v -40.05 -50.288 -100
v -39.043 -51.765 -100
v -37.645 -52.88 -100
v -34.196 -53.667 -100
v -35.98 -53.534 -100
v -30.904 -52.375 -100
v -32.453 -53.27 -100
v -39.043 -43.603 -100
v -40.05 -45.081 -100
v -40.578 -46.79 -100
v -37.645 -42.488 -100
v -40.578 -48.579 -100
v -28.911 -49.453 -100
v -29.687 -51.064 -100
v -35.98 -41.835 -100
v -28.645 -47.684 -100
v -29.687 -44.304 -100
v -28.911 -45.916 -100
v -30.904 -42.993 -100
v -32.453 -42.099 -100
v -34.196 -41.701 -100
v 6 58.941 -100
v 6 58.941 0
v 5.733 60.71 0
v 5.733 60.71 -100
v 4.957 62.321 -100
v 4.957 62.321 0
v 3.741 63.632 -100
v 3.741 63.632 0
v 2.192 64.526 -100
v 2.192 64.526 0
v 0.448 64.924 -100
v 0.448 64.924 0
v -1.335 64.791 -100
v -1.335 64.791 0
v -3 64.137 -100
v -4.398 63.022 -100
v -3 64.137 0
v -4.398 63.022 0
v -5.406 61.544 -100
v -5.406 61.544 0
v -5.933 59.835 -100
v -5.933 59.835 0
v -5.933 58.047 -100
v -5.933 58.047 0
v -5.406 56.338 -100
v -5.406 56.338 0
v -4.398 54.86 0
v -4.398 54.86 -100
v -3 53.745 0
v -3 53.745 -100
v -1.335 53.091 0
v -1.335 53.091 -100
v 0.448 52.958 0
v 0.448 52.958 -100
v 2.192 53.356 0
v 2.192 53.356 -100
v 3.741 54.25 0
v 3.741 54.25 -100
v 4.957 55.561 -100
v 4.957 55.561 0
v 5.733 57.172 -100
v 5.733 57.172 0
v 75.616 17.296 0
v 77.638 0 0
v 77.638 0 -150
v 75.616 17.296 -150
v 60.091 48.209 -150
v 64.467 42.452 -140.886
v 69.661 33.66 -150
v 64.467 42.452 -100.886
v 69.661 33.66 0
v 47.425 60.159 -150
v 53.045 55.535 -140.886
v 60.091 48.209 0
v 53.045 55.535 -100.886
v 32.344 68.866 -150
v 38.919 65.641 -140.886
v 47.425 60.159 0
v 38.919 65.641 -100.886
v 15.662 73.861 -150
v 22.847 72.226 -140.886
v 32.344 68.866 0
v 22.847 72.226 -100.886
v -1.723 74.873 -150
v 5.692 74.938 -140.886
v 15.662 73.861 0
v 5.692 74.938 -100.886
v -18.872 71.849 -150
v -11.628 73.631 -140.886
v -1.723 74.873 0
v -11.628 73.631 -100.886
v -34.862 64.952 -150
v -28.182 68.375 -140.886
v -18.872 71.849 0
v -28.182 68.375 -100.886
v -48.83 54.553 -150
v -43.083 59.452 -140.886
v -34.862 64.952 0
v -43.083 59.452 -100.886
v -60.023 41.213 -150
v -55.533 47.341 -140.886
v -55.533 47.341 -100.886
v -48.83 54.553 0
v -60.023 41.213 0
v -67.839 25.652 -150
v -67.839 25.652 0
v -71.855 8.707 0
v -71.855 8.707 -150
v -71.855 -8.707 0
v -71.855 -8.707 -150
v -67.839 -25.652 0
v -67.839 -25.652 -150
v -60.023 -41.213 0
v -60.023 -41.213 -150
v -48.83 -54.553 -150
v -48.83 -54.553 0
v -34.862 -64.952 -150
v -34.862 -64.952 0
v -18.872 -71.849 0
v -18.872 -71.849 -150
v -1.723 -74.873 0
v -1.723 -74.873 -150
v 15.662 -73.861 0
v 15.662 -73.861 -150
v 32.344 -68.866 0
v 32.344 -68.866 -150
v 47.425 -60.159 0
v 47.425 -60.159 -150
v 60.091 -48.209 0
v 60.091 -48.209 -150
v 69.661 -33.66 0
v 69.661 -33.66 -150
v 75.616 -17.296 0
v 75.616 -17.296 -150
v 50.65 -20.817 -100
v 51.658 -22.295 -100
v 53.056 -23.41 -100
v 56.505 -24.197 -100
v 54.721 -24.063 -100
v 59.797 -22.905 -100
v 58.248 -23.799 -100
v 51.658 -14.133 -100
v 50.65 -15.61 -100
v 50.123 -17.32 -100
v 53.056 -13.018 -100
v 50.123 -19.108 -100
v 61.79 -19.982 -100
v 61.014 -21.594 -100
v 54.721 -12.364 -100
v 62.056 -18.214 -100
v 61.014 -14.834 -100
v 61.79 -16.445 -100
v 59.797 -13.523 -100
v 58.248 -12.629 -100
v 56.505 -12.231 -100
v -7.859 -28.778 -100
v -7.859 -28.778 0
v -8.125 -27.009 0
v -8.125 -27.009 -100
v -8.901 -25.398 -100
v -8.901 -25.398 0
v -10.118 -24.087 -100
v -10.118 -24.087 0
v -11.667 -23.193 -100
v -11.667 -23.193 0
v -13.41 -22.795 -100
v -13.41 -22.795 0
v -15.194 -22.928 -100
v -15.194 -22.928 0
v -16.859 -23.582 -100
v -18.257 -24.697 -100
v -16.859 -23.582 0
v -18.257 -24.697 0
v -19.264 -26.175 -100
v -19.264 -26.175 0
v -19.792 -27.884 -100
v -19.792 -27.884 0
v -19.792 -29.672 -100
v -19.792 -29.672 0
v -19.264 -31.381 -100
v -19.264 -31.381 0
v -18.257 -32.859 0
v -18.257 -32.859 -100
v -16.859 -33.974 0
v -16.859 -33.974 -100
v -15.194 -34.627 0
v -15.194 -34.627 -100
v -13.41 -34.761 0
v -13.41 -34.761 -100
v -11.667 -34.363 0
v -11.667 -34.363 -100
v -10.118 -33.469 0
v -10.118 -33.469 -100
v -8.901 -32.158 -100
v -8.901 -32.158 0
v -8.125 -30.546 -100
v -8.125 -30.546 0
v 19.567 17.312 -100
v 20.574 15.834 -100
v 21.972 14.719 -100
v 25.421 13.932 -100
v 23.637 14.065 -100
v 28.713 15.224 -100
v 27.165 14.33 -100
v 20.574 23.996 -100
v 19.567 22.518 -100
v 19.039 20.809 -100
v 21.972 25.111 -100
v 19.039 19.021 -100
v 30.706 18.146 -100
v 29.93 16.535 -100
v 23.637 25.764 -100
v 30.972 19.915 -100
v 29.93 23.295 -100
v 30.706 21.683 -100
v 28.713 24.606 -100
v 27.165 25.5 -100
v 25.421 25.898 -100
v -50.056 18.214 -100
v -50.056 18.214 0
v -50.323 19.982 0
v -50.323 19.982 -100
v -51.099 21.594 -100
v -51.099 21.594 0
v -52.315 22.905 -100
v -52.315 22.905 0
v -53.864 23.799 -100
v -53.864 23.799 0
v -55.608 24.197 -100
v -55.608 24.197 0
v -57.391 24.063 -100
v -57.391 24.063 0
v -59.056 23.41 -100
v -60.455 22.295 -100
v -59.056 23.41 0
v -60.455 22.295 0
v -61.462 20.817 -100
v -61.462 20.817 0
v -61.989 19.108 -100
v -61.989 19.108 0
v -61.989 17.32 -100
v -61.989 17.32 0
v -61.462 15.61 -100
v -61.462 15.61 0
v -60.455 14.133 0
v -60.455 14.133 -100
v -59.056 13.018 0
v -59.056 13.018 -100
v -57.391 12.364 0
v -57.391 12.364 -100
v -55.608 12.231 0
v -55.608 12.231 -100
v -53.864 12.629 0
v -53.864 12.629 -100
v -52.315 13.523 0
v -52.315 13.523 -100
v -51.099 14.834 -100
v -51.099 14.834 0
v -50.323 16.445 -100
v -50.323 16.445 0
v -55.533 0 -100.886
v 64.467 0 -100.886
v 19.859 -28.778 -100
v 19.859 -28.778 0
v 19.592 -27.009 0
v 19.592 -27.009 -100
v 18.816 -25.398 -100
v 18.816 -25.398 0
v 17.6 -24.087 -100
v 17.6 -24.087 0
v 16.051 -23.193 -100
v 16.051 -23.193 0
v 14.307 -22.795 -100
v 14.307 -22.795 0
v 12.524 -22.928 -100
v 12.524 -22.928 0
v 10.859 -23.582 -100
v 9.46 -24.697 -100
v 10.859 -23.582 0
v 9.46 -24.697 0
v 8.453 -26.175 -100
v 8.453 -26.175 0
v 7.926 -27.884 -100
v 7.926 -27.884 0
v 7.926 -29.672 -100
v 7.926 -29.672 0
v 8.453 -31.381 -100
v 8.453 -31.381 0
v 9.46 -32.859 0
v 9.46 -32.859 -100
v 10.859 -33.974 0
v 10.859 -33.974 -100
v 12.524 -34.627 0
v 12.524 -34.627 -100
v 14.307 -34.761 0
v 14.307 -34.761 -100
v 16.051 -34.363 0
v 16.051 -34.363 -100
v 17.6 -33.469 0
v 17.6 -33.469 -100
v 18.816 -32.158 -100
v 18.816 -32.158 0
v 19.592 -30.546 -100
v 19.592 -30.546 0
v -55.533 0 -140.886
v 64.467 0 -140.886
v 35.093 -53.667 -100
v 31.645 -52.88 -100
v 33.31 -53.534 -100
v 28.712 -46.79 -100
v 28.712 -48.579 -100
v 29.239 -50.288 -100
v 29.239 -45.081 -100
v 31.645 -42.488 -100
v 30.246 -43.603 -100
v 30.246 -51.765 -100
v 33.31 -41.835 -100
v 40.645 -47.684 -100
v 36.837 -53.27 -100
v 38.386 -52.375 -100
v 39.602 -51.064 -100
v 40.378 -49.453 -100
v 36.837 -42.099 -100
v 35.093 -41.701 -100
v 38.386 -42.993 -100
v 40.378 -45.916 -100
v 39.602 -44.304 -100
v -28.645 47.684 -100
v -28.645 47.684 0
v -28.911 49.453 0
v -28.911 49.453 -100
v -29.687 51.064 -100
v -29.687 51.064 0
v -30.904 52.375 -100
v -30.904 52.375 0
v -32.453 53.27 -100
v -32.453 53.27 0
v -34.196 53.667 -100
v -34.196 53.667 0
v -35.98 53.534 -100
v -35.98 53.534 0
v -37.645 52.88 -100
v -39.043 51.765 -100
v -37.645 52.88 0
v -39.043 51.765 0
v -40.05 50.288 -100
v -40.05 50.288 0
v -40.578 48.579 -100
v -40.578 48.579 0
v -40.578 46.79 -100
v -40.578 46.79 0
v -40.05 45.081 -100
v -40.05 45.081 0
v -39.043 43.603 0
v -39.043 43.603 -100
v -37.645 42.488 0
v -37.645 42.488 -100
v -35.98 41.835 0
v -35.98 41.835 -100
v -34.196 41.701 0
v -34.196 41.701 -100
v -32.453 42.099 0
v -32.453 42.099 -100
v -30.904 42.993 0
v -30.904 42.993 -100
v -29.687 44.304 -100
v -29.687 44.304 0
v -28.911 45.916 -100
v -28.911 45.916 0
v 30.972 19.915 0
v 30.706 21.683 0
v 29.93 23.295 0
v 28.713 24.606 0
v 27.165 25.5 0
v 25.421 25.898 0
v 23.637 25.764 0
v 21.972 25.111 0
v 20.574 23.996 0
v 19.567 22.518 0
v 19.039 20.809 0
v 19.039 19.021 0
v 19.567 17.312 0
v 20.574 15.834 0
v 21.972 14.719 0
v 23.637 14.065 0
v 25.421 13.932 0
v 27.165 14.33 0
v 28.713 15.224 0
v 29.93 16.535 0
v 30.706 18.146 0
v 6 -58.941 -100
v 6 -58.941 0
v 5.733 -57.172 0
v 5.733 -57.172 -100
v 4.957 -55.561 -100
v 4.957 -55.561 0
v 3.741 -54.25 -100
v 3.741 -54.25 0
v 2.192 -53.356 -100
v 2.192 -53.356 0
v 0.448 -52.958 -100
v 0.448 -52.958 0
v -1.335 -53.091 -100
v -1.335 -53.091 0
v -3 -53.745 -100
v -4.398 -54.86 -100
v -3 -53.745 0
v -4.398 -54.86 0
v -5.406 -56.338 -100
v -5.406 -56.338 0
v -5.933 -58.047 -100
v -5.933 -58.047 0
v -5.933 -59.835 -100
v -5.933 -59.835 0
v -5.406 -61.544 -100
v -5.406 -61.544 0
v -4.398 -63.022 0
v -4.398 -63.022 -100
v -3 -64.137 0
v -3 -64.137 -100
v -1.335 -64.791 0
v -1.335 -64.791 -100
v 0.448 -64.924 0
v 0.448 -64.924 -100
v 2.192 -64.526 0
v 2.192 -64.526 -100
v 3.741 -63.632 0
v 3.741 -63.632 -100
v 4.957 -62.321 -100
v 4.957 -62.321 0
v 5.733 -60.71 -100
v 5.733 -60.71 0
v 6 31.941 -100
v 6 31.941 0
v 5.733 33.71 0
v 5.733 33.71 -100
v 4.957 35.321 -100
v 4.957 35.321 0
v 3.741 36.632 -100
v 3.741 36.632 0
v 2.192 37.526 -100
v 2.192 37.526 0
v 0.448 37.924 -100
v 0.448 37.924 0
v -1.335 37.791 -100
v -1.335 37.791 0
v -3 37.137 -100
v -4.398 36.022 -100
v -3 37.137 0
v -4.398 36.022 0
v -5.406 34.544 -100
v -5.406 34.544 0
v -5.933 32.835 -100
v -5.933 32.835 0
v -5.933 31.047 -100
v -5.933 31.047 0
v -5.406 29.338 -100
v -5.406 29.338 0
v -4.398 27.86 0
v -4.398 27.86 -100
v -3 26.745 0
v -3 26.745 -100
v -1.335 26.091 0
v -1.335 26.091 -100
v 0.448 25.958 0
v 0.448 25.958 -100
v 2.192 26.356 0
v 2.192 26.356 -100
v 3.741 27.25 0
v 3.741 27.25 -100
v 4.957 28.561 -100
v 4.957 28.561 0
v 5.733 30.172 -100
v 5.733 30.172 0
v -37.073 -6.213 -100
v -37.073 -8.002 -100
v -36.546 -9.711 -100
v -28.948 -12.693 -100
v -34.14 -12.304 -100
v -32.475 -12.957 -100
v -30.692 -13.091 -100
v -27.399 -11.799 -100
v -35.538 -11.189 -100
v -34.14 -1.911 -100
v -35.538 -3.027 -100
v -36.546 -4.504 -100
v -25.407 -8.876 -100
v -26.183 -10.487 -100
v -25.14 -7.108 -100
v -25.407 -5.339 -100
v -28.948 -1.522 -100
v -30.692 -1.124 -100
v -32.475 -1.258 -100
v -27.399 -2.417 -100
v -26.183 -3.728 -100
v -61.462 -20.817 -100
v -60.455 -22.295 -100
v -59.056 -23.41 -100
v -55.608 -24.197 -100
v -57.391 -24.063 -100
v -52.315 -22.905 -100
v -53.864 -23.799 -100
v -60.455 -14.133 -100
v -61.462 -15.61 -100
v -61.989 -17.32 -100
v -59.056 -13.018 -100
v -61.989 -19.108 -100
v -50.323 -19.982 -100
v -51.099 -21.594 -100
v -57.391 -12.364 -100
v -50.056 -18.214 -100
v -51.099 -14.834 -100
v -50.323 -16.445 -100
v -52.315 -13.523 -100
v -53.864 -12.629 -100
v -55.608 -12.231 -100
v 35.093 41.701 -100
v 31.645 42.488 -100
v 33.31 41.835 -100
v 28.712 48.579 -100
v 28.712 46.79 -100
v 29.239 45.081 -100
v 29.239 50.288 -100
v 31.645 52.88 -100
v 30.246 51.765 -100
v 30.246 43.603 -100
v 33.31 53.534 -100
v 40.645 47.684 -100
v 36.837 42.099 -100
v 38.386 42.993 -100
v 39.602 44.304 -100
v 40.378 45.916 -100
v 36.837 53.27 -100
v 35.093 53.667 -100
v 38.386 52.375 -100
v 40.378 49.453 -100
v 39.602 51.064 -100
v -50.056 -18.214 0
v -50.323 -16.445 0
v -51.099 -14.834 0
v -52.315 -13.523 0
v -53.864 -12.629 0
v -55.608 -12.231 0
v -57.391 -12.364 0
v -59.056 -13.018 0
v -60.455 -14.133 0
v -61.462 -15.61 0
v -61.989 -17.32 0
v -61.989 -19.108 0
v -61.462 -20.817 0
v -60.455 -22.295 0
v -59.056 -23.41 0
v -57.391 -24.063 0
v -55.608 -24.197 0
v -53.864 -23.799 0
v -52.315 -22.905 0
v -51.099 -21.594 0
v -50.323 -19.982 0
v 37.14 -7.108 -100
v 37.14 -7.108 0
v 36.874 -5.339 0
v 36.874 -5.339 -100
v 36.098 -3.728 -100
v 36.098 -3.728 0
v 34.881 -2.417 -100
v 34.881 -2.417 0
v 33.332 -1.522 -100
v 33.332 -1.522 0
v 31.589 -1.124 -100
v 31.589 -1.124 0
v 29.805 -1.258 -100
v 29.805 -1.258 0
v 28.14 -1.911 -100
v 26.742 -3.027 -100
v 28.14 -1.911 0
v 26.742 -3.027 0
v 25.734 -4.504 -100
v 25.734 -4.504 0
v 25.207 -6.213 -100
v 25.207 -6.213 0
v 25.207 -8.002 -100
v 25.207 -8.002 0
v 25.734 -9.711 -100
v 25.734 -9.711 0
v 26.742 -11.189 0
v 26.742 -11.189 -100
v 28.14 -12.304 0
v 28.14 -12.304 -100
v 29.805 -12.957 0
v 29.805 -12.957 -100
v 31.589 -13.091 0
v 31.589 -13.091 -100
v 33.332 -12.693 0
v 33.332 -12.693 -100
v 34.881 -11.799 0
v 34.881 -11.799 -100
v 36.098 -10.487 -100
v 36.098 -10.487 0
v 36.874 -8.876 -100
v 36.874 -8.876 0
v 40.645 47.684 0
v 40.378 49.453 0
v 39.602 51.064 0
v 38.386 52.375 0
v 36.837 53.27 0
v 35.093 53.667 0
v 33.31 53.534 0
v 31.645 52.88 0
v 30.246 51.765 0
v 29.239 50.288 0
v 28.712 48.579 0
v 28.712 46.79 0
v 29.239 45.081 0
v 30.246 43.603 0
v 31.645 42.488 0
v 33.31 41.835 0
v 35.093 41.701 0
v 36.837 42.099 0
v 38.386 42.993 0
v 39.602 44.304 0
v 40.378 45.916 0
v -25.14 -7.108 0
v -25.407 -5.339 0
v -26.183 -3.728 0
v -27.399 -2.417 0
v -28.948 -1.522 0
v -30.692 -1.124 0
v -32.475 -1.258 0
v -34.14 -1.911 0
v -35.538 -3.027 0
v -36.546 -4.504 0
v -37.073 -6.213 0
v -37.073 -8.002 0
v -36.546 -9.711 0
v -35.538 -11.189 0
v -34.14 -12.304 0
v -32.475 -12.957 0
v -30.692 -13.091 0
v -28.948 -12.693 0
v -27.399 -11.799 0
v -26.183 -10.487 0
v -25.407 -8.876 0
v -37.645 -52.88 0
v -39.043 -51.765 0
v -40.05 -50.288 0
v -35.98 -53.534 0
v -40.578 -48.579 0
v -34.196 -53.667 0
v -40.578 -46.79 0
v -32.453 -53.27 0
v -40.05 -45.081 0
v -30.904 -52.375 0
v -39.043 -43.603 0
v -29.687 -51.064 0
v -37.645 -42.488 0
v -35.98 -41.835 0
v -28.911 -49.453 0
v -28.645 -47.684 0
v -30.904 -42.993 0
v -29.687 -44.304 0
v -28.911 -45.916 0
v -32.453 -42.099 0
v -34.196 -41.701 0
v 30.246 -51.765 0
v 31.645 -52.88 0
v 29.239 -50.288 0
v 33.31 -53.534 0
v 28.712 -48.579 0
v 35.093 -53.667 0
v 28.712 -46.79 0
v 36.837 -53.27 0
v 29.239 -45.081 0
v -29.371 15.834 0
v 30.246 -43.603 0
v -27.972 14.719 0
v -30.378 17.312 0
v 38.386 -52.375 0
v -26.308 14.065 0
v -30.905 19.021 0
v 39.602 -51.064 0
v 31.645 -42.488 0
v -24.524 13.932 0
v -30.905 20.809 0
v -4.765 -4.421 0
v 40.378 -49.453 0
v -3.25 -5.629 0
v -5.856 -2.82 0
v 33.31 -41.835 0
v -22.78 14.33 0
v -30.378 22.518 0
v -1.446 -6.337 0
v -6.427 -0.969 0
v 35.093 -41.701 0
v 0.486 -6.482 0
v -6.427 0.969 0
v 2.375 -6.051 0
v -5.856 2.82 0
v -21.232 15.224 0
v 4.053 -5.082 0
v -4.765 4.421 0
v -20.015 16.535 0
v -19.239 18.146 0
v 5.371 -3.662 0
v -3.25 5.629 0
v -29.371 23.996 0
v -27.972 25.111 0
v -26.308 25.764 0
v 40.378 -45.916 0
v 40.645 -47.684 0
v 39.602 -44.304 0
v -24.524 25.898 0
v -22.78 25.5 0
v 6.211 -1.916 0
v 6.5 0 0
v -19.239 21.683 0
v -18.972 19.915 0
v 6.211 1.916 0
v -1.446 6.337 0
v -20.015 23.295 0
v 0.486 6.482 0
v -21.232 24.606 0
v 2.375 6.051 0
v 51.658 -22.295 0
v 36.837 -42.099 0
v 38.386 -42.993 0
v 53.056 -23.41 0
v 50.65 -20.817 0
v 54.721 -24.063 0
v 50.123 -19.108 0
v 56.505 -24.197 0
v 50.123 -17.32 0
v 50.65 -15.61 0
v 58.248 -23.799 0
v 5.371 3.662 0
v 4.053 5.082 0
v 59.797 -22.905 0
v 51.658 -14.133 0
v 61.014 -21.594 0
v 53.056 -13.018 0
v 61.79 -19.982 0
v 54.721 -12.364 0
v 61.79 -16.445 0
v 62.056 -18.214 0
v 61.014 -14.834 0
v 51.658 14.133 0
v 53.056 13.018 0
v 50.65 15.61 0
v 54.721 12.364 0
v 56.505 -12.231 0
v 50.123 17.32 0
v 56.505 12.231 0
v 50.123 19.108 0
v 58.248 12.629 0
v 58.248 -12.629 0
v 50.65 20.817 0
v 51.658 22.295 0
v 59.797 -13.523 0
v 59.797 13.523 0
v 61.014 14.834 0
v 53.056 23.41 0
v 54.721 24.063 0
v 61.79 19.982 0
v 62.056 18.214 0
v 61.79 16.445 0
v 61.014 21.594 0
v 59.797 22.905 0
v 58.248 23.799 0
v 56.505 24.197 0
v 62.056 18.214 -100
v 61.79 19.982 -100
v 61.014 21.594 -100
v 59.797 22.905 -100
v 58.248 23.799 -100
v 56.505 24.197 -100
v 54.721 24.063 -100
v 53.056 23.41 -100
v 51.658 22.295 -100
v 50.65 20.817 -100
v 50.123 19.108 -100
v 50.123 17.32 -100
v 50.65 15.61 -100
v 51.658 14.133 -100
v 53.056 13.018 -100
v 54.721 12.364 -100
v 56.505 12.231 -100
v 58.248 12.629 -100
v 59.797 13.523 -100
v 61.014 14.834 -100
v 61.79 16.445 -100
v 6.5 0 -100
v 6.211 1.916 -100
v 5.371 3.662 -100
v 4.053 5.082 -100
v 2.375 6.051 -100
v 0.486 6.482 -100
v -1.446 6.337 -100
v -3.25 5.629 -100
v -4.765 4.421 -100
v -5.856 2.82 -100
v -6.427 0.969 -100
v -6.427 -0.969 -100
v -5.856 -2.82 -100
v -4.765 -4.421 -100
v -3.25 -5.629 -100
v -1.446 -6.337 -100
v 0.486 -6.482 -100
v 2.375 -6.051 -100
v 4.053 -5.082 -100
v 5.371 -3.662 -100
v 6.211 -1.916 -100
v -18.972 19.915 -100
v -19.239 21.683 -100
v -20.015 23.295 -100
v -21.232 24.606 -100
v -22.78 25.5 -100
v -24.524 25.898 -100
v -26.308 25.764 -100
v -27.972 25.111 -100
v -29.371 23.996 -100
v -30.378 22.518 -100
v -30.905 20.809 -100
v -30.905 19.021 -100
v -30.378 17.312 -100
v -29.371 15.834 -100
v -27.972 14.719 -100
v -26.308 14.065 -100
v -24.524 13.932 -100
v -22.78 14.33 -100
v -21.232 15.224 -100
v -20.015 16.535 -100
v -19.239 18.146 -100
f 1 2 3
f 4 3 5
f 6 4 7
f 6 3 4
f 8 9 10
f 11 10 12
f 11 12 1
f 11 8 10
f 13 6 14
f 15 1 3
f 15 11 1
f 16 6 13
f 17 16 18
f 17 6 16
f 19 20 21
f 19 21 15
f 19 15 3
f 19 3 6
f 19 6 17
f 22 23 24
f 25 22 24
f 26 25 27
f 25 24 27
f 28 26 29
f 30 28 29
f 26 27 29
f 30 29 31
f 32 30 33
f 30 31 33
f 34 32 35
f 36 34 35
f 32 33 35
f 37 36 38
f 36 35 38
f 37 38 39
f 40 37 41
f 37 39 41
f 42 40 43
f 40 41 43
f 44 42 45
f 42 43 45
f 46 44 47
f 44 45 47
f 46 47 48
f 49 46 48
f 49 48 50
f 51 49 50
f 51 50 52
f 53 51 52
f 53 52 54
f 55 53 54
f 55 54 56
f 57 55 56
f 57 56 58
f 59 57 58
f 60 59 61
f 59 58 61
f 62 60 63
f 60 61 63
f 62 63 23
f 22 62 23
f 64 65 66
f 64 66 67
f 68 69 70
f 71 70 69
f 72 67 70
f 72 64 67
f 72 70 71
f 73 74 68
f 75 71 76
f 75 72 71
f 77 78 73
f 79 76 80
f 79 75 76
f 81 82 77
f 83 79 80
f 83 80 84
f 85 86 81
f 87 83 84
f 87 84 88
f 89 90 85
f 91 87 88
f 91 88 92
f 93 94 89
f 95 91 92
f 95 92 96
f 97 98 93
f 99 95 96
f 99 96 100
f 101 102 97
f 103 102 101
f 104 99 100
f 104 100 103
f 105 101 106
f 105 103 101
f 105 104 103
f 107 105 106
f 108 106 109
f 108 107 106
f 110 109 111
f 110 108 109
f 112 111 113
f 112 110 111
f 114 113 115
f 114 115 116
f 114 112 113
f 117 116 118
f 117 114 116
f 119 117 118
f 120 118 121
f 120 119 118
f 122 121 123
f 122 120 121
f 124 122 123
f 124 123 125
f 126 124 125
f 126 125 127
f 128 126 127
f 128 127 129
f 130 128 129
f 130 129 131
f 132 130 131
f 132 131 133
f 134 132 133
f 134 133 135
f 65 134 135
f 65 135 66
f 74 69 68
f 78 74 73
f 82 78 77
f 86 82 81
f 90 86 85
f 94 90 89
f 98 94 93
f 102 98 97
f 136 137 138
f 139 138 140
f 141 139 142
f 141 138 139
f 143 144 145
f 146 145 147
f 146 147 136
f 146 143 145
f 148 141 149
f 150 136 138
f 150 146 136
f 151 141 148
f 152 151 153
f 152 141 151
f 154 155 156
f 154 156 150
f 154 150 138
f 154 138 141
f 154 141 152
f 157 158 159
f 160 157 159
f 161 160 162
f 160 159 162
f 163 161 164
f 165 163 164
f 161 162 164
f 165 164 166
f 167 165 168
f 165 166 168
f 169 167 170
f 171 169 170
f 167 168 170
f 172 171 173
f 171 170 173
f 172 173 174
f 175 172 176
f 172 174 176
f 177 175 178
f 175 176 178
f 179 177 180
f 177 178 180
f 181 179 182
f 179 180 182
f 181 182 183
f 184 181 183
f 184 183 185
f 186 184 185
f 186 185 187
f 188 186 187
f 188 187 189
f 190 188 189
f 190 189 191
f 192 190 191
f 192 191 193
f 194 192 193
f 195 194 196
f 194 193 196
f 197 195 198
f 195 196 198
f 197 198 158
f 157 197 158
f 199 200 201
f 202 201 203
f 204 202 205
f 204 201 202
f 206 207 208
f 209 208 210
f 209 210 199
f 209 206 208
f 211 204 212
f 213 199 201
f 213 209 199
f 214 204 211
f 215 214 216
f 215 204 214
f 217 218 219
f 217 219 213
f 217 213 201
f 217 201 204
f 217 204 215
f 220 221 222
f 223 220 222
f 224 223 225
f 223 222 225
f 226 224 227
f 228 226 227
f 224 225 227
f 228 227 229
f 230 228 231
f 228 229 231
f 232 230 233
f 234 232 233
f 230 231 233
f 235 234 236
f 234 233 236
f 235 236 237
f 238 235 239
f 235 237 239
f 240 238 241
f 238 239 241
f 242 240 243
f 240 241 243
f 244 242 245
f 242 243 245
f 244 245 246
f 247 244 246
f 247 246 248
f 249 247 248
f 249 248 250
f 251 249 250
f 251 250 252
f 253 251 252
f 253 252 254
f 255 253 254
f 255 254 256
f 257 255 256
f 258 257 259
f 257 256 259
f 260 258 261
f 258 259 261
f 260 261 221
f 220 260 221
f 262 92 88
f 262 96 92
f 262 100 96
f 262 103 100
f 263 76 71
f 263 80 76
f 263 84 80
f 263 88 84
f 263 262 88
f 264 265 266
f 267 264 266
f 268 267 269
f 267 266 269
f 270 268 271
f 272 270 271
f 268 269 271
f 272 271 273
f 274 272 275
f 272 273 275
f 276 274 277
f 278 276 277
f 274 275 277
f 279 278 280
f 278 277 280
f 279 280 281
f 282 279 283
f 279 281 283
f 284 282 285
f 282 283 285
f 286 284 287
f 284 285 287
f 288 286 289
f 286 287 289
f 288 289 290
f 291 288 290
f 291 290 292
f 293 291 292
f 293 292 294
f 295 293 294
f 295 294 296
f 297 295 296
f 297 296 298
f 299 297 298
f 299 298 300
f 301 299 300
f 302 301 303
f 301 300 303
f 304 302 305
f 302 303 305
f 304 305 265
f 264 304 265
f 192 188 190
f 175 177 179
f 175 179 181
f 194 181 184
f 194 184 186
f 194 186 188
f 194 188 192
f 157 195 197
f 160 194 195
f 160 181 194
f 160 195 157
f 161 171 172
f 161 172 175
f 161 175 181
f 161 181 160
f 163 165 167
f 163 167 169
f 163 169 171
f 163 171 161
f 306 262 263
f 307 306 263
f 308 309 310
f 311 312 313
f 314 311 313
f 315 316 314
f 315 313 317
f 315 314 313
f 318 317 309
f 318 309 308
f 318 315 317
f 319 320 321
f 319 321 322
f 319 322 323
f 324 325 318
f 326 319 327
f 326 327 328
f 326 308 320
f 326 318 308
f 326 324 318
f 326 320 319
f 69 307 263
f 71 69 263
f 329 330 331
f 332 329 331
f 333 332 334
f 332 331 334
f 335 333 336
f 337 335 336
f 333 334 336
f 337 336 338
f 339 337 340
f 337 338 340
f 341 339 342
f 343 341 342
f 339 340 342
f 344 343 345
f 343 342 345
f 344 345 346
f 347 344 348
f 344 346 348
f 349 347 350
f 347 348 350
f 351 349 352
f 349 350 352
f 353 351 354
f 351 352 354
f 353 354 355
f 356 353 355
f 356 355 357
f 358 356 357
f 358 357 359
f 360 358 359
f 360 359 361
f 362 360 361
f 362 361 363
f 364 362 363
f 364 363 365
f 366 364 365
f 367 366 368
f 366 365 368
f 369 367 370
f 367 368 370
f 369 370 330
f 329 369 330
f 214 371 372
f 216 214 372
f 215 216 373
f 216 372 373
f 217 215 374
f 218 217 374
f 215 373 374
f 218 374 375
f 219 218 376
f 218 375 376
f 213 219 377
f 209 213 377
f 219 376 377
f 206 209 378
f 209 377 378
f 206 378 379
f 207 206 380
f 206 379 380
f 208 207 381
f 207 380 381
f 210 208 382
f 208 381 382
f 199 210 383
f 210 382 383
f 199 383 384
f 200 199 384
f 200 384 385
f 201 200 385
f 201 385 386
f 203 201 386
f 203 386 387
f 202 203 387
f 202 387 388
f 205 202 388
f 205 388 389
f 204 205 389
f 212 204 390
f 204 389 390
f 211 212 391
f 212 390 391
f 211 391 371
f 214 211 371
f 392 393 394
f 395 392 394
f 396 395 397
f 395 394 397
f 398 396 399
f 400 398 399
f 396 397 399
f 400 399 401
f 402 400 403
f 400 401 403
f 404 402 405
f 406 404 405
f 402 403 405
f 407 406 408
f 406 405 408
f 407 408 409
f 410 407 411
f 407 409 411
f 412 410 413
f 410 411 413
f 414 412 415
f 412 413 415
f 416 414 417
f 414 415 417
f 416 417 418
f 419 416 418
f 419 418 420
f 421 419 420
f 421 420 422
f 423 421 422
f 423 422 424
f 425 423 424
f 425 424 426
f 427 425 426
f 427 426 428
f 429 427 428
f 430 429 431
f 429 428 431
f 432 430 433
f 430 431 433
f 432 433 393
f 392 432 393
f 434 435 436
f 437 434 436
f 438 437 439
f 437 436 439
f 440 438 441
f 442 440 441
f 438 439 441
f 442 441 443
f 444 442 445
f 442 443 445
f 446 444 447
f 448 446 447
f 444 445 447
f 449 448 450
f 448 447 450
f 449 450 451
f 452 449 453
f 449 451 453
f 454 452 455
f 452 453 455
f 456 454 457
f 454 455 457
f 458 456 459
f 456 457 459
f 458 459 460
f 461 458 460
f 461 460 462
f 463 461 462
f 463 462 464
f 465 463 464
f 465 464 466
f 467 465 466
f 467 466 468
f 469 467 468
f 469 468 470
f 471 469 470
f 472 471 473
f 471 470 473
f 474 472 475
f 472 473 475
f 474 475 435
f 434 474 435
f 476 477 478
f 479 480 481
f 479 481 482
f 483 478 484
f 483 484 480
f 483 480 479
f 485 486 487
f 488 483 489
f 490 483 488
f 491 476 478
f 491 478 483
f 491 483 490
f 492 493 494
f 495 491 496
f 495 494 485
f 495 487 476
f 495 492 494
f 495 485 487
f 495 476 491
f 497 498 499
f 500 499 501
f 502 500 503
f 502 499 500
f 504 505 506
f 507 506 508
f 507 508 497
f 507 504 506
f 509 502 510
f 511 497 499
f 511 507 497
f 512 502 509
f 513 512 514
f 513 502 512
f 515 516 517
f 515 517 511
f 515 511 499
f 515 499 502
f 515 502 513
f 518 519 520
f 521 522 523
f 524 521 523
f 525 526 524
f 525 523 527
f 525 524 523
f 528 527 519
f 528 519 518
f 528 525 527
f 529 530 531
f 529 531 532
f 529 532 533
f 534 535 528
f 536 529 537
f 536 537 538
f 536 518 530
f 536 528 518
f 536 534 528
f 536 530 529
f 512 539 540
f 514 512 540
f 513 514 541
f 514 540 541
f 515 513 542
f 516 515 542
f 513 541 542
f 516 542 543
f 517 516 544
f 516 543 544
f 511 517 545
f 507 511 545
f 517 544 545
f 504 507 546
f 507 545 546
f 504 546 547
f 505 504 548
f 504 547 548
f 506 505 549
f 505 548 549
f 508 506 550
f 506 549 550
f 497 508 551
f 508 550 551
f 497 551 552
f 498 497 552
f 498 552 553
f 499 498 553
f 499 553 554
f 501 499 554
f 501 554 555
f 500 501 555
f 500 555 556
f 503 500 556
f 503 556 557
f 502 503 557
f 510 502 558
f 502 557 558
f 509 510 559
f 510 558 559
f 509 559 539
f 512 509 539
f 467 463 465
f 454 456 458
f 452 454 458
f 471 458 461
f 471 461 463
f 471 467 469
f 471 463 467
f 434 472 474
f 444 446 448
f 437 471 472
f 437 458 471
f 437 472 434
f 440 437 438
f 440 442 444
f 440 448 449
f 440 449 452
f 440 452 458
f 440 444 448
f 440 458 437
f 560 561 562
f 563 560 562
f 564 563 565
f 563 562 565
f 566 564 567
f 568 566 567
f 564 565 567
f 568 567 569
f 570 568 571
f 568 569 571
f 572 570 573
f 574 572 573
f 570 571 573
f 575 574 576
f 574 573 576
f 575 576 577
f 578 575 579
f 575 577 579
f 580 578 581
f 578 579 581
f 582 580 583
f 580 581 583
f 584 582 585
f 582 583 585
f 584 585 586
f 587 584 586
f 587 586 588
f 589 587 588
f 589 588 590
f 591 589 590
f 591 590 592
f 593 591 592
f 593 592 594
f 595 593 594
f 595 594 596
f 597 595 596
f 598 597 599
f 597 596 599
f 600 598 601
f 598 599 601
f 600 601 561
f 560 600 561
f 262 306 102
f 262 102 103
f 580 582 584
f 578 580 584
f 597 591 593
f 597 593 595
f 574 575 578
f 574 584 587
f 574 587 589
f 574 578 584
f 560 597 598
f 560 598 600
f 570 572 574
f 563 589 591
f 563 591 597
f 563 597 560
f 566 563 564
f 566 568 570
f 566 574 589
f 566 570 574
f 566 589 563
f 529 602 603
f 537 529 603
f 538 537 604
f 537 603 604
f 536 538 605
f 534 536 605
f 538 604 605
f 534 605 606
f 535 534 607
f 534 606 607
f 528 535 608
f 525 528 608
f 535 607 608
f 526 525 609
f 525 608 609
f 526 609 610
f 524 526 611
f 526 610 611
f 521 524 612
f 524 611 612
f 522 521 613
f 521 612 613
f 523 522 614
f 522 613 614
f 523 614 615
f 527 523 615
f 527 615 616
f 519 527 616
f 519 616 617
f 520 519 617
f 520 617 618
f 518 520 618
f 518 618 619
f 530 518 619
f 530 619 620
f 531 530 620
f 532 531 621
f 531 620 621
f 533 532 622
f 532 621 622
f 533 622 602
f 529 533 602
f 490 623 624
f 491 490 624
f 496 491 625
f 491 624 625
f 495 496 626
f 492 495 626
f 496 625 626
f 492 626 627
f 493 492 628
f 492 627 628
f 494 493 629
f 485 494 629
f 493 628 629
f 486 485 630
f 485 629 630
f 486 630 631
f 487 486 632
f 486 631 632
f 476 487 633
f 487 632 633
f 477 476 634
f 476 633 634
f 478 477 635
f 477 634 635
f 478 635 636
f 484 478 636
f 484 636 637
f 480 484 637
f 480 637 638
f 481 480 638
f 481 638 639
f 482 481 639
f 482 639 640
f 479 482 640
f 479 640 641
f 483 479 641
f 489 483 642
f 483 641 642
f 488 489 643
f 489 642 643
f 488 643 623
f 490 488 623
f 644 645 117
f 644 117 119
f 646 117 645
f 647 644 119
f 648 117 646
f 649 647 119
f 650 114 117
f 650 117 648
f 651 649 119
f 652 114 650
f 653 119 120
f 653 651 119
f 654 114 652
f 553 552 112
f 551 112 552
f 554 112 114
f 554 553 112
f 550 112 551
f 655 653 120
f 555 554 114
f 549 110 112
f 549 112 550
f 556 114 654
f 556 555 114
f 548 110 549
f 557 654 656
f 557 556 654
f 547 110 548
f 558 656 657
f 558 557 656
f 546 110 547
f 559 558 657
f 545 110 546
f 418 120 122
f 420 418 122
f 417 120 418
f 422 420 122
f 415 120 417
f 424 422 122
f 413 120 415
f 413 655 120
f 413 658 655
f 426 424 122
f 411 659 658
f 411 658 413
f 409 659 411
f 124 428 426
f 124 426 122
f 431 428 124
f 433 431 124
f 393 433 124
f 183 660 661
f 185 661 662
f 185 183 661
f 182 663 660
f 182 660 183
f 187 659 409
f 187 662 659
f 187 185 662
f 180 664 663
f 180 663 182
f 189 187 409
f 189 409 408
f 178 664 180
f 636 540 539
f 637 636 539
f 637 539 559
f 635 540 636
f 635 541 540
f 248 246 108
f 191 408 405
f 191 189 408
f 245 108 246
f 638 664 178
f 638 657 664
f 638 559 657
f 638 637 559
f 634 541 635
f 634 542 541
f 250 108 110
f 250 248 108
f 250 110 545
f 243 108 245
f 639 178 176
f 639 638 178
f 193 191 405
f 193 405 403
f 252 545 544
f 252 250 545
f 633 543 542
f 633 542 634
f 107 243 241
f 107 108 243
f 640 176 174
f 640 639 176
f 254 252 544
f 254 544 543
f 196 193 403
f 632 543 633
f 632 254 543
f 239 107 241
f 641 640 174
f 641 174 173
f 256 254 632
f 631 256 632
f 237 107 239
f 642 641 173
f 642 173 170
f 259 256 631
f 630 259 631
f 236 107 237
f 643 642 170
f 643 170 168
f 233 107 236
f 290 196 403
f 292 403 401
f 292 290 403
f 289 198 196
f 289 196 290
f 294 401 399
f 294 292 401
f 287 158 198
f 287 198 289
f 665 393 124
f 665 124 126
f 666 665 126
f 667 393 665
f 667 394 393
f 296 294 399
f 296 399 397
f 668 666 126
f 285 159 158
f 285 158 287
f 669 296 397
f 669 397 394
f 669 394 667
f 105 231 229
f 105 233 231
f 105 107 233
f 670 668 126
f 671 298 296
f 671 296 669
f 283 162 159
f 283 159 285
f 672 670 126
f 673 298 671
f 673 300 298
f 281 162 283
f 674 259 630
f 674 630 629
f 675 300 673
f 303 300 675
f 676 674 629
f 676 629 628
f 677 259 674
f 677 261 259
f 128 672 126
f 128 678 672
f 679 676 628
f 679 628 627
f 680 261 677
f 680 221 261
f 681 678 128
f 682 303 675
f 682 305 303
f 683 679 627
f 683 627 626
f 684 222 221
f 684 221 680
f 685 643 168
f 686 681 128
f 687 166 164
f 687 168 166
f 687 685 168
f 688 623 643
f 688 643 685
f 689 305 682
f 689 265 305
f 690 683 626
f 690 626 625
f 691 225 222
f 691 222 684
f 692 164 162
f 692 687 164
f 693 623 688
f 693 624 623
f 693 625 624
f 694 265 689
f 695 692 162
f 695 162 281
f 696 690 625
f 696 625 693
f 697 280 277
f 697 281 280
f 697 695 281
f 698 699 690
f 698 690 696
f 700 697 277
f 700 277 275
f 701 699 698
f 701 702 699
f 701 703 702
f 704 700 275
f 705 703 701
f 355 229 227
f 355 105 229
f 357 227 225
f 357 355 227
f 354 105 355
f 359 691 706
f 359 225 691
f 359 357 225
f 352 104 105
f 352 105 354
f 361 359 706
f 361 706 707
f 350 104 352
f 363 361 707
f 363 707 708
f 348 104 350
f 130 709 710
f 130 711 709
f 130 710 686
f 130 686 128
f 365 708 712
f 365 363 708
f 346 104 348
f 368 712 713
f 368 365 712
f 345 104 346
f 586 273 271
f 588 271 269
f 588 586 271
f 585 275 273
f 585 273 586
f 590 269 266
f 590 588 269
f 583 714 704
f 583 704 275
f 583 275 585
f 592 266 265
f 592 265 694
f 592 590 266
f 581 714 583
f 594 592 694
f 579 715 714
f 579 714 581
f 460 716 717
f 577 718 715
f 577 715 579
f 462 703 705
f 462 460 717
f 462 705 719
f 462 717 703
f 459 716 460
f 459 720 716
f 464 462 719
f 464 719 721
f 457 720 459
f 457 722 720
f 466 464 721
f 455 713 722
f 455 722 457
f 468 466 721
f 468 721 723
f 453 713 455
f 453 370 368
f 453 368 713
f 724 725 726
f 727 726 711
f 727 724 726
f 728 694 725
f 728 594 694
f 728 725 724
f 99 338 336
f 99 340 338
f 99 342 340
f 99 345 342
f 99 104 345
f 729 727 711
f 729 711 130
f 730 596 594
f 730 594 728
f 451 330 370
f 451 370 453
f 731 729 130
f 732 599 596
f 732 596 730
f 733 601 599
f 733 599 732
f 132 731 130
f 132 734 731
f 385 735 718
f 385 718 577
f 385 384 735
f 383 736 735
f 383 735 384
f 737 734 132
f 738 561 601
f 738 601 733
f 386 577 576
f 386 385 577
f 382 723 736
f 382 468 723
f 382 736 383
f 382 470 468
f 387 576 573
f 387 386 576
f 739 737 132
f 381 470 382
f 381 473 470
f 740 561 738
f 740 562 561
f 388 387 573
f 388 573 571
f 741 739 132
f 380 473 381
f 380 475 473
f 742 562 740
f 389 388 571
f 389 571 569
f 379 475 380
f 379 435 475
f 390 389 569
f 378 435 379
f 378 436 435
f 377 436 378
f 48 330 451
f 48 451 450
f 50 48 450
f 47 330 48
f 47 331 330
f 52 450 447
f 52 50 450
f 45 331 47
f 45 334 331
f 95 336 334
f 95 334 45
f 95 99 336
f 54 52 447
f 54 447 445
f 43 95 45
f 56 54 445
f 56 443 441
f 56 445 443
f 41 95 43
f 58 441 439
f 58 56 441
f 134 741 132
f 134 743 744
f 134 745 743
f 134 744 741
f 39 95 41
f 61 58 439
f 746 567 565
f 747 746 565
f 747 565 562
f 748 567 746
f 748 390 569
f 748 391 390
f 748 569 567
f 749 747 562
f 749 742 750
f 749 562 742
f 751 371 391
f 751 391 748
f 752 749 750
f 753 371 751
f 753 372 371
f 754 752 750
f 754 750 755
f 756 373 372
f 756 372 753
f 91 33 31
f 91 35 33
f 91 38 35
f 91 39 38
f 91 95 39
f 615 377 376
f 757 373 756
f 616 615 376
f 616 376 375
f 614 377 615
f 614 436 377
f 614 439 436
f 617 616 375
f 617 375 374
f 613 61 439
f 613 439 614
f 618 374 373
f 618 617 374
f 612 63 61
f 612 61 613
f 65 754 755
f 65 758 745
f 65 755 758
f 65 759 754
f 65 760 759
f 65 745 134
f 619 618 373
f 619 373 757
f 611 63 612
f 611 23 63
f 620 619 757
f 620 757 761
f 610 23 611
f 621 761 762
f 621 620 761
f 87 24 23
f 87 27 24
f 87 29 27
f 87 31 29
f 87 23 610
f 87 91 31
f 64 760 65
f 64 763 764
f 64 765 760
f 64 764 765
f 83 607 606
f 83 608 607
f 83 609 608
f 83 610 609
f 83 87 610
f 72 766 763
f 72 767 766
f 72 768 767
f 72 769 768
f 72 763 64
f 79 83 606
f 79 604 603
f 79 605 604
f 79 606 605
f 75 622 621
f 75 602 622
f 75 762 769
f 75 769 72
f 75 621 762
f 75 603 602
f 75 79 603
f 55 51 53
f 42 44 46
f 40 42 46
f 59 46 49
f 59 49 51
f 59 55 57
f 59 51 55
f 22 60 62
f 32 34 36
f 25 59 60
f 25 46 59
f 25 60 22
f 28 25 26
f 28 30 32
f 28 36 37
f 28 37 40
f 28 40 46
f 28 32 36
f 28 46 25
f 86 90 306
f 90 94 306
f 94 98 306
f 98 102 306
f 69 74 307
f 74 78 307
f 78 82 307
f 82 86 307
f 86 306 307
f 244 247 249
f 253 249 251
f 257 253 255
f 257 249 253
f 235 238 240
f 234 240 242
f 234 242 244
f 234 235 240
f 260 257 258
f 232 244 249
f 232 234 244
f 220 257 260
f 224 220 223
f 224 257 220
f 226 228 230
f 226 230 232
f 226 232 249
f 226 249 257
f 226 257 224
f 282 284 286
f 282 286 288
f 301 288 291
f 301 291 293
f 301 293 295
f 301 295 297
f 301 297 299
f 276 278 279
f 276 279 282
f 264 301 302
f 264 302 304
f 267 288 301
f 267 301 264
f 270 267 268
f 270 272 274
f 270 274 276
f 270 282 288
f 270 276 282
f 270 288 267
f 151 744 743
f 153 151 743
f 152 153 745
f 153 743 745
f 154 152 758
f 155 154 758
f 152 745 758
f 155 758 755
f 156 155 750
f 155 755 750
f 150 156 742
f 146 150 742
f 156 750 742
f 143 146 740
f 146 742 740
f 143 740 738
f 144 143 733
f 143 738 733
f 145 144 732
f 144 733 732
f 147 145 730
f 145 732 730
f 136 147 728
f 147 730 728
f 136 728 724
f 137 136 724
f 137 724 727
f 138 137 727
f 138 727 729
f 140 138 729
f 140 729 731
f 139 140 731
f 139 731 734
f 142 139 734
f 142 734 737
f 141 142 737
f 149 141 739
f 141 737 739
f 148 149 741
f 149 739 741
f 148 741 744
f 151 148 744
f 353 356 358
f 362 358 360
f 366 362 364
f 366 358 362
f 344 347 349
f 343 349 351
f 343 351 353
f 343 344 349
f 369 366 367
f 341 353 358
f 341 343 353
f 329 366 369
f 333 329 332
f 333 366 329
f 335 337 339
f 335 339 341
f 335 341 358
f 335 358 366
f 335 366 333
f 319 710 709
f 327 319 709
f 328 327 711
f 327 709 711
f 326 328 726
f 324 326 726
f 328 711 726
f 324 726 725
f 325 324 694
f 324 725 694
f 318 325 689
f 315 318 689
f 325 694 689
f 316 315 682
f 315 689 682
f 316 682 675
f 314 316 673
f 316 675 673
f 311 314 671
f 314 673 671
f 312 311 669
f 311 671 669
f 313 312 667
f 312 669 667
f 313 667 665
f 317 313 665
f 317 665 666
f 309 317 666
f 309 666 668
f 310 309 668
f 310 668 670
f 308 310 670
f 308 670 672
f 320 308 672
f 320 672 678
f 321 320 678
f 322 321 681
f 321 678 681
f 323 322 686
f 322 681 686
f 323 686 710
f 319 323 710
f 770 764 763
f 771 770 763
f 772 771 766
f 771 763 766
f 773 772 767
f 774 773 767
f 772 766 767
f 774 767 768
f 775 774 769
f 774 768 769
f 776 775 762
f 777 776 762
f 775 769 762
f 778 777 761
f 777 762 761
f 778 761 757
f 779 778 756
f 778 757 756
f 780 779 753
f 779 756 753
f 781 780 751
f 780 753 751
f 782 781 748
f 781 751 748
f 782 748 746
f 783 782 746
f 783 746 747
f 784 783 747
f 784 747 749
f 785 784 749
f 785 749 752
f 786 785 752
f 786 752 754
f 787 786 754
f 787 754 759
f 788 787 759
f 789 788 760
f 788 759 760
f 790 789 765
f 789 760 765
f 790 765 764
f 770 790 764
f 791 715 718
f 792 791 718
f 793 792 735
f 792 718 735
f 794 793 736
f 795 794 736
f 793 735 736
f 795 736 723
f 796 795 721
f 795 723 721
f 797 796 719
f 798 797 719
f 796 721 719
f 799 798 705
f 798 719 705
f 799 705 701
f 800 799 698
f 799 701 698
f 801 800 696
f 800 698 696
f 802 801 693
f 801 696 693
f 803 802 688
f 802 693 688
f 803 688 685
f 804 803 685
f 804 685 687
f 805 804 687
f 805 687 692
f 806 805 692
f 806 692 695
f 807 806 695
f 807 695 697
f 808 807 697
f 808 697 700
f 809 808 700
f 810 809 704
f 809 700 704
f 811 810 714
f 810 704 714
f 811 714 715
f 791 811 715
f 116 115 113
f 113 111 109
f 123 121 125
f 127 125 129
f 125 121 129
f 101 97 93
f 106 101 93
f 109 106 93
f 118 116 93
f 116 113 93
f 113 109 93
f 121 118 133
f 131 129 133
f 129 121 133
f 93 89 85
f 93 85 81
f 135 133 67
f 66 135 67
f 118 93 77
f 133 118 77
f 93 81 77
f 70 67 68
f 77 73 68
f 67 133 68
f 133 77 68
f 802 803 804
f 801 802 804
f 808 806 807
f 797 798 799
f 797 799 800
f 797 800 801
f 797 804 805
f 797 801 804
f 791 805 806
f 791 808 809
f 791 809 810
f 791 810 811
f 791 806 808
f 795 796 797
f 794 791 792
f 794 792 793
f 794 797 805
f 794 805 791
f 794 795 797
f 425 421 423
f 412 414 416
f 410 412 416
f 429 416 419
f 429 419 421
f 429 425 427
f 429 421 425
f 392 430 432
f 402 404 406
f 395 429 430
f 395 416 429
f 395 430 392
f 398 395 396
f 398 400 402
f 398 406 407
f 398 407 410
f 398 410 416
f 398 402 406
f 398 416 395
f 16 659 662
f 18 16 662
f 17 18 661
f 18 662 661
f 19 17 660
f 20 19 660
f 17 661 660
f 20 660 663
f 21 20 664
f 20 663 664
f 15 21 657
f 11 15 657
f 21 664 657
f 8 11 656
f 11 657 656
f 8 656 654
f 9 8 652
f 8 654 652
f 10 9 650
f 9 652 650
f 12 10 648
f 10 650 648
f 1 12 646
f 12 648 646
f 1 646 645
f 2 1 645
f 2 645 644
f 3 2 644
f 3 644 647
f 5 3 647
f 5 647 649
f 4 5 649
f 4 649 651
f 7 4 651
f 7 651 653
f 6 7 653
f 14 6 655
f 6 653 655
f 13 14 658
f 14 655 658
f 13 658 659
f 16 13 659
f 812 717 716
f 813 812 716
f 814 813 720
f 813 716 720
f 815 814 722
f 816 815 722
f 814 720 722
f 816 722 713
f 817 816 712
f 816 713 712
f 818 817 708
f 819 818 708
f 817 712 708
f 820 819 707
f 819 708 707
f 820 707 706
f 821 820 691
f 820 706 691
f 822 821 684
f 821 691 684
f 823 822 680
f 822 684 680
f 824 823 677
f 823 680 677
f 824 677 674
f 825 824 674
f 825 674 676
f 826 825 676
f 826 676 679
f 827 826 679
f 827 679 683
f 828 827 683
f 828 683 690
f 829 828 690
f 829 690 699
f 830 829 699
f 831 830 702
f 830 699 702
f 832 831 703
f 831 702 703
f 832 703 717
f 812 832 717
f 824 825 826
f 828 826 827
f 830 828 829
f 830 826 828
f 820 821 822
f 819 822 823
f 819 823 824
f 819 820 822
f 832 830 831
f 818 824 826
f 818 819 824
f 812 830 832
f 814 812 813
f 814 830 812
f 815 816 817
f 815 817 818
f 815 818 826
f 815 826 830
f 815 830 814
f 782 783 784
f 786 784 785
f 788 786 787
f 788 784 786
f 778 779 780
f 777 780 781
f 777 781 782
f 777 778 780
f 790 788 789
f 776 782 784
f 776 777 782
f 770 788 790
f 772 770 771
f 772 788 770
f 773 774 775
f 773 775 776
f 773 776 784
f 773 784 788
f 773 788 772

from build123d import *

# Parameters (mm, degrees)
F0_R     = 75
F2_DEPTH = 150
F1_R     = 6
F1_R_2   = 6.5
F3_DEPTH = 100
F4_W     = 120
F4_H     = 40
F5_DEPTH = 90


with BuildPart() as f2:
    # F0 (on Top) → F2 (new body)
    with BuildSketch(Plane.XY):
        with Locations((2.638103, 0)):
            Circle(F0_R)
    extrude(amount=-F2_DEPTH)

    # F1 (on face) → F3 (cut)
    with BuildSketch(Plane.XY):
        with Locations((0, 58.940991)):
            Circle(F1_R)
        with Locations((-34.644645, 47.684263)):
            Circle(F1_R)
        with Locations((-56.056213, 18.213768)):
            Circle(F1_R)
        with Locations((-56.056213, -18.213768)):
            Circle(F1_R)
        with Locations((-34.644645, -47.684263)):
            Circle(F1_R)
        with Locations((0, -58.940991)):
            Circle(F1_R)
        with Locations((34.644645, -47.684263)):
            Circle(F1_R)
        with Locations((56.056213, -18.213768)):
            Circle(F1_R)
        with Locations((56.056213, 18.213768)):
            Circle(F1_R)
        with Locations((34.644645, 47.684263)):
            Circle(F1_R)
        with Locations((0, 31.940991)):
            Circle(F1_R)
        with Locations((-24.972472, 19.914882)):
            Circle(F1_R)
        with Locations((-31.140164, -7.107539)):
            Circle(F1_R)
        with Locations((-13.858677, -28.777838)):
            Circle(F1_R)
        with Locations((13.858677, -28.777838)):
            Circle(F1_R)
        with Locations((31.140164, -7.107539)):
            Circle(F1_R)
        with Locations((24.972472, 19.914882)):
            Circle(F1_R)
        Circle(F1_R_2)
    extrude(amount=-F3_DEPTH, mode=Mode.SUBTRACT)

    # F4 (on Front) → F5 (cut)
    with BuildSketch(Plane.XZ):
        with Locations((4.467444, -120.885696)):
            Rectangle(F4_W, F4_H)
    extrude(amount=-F5_DEPTH, mode=Mode.SUBTRACT)


solid = f2.part
